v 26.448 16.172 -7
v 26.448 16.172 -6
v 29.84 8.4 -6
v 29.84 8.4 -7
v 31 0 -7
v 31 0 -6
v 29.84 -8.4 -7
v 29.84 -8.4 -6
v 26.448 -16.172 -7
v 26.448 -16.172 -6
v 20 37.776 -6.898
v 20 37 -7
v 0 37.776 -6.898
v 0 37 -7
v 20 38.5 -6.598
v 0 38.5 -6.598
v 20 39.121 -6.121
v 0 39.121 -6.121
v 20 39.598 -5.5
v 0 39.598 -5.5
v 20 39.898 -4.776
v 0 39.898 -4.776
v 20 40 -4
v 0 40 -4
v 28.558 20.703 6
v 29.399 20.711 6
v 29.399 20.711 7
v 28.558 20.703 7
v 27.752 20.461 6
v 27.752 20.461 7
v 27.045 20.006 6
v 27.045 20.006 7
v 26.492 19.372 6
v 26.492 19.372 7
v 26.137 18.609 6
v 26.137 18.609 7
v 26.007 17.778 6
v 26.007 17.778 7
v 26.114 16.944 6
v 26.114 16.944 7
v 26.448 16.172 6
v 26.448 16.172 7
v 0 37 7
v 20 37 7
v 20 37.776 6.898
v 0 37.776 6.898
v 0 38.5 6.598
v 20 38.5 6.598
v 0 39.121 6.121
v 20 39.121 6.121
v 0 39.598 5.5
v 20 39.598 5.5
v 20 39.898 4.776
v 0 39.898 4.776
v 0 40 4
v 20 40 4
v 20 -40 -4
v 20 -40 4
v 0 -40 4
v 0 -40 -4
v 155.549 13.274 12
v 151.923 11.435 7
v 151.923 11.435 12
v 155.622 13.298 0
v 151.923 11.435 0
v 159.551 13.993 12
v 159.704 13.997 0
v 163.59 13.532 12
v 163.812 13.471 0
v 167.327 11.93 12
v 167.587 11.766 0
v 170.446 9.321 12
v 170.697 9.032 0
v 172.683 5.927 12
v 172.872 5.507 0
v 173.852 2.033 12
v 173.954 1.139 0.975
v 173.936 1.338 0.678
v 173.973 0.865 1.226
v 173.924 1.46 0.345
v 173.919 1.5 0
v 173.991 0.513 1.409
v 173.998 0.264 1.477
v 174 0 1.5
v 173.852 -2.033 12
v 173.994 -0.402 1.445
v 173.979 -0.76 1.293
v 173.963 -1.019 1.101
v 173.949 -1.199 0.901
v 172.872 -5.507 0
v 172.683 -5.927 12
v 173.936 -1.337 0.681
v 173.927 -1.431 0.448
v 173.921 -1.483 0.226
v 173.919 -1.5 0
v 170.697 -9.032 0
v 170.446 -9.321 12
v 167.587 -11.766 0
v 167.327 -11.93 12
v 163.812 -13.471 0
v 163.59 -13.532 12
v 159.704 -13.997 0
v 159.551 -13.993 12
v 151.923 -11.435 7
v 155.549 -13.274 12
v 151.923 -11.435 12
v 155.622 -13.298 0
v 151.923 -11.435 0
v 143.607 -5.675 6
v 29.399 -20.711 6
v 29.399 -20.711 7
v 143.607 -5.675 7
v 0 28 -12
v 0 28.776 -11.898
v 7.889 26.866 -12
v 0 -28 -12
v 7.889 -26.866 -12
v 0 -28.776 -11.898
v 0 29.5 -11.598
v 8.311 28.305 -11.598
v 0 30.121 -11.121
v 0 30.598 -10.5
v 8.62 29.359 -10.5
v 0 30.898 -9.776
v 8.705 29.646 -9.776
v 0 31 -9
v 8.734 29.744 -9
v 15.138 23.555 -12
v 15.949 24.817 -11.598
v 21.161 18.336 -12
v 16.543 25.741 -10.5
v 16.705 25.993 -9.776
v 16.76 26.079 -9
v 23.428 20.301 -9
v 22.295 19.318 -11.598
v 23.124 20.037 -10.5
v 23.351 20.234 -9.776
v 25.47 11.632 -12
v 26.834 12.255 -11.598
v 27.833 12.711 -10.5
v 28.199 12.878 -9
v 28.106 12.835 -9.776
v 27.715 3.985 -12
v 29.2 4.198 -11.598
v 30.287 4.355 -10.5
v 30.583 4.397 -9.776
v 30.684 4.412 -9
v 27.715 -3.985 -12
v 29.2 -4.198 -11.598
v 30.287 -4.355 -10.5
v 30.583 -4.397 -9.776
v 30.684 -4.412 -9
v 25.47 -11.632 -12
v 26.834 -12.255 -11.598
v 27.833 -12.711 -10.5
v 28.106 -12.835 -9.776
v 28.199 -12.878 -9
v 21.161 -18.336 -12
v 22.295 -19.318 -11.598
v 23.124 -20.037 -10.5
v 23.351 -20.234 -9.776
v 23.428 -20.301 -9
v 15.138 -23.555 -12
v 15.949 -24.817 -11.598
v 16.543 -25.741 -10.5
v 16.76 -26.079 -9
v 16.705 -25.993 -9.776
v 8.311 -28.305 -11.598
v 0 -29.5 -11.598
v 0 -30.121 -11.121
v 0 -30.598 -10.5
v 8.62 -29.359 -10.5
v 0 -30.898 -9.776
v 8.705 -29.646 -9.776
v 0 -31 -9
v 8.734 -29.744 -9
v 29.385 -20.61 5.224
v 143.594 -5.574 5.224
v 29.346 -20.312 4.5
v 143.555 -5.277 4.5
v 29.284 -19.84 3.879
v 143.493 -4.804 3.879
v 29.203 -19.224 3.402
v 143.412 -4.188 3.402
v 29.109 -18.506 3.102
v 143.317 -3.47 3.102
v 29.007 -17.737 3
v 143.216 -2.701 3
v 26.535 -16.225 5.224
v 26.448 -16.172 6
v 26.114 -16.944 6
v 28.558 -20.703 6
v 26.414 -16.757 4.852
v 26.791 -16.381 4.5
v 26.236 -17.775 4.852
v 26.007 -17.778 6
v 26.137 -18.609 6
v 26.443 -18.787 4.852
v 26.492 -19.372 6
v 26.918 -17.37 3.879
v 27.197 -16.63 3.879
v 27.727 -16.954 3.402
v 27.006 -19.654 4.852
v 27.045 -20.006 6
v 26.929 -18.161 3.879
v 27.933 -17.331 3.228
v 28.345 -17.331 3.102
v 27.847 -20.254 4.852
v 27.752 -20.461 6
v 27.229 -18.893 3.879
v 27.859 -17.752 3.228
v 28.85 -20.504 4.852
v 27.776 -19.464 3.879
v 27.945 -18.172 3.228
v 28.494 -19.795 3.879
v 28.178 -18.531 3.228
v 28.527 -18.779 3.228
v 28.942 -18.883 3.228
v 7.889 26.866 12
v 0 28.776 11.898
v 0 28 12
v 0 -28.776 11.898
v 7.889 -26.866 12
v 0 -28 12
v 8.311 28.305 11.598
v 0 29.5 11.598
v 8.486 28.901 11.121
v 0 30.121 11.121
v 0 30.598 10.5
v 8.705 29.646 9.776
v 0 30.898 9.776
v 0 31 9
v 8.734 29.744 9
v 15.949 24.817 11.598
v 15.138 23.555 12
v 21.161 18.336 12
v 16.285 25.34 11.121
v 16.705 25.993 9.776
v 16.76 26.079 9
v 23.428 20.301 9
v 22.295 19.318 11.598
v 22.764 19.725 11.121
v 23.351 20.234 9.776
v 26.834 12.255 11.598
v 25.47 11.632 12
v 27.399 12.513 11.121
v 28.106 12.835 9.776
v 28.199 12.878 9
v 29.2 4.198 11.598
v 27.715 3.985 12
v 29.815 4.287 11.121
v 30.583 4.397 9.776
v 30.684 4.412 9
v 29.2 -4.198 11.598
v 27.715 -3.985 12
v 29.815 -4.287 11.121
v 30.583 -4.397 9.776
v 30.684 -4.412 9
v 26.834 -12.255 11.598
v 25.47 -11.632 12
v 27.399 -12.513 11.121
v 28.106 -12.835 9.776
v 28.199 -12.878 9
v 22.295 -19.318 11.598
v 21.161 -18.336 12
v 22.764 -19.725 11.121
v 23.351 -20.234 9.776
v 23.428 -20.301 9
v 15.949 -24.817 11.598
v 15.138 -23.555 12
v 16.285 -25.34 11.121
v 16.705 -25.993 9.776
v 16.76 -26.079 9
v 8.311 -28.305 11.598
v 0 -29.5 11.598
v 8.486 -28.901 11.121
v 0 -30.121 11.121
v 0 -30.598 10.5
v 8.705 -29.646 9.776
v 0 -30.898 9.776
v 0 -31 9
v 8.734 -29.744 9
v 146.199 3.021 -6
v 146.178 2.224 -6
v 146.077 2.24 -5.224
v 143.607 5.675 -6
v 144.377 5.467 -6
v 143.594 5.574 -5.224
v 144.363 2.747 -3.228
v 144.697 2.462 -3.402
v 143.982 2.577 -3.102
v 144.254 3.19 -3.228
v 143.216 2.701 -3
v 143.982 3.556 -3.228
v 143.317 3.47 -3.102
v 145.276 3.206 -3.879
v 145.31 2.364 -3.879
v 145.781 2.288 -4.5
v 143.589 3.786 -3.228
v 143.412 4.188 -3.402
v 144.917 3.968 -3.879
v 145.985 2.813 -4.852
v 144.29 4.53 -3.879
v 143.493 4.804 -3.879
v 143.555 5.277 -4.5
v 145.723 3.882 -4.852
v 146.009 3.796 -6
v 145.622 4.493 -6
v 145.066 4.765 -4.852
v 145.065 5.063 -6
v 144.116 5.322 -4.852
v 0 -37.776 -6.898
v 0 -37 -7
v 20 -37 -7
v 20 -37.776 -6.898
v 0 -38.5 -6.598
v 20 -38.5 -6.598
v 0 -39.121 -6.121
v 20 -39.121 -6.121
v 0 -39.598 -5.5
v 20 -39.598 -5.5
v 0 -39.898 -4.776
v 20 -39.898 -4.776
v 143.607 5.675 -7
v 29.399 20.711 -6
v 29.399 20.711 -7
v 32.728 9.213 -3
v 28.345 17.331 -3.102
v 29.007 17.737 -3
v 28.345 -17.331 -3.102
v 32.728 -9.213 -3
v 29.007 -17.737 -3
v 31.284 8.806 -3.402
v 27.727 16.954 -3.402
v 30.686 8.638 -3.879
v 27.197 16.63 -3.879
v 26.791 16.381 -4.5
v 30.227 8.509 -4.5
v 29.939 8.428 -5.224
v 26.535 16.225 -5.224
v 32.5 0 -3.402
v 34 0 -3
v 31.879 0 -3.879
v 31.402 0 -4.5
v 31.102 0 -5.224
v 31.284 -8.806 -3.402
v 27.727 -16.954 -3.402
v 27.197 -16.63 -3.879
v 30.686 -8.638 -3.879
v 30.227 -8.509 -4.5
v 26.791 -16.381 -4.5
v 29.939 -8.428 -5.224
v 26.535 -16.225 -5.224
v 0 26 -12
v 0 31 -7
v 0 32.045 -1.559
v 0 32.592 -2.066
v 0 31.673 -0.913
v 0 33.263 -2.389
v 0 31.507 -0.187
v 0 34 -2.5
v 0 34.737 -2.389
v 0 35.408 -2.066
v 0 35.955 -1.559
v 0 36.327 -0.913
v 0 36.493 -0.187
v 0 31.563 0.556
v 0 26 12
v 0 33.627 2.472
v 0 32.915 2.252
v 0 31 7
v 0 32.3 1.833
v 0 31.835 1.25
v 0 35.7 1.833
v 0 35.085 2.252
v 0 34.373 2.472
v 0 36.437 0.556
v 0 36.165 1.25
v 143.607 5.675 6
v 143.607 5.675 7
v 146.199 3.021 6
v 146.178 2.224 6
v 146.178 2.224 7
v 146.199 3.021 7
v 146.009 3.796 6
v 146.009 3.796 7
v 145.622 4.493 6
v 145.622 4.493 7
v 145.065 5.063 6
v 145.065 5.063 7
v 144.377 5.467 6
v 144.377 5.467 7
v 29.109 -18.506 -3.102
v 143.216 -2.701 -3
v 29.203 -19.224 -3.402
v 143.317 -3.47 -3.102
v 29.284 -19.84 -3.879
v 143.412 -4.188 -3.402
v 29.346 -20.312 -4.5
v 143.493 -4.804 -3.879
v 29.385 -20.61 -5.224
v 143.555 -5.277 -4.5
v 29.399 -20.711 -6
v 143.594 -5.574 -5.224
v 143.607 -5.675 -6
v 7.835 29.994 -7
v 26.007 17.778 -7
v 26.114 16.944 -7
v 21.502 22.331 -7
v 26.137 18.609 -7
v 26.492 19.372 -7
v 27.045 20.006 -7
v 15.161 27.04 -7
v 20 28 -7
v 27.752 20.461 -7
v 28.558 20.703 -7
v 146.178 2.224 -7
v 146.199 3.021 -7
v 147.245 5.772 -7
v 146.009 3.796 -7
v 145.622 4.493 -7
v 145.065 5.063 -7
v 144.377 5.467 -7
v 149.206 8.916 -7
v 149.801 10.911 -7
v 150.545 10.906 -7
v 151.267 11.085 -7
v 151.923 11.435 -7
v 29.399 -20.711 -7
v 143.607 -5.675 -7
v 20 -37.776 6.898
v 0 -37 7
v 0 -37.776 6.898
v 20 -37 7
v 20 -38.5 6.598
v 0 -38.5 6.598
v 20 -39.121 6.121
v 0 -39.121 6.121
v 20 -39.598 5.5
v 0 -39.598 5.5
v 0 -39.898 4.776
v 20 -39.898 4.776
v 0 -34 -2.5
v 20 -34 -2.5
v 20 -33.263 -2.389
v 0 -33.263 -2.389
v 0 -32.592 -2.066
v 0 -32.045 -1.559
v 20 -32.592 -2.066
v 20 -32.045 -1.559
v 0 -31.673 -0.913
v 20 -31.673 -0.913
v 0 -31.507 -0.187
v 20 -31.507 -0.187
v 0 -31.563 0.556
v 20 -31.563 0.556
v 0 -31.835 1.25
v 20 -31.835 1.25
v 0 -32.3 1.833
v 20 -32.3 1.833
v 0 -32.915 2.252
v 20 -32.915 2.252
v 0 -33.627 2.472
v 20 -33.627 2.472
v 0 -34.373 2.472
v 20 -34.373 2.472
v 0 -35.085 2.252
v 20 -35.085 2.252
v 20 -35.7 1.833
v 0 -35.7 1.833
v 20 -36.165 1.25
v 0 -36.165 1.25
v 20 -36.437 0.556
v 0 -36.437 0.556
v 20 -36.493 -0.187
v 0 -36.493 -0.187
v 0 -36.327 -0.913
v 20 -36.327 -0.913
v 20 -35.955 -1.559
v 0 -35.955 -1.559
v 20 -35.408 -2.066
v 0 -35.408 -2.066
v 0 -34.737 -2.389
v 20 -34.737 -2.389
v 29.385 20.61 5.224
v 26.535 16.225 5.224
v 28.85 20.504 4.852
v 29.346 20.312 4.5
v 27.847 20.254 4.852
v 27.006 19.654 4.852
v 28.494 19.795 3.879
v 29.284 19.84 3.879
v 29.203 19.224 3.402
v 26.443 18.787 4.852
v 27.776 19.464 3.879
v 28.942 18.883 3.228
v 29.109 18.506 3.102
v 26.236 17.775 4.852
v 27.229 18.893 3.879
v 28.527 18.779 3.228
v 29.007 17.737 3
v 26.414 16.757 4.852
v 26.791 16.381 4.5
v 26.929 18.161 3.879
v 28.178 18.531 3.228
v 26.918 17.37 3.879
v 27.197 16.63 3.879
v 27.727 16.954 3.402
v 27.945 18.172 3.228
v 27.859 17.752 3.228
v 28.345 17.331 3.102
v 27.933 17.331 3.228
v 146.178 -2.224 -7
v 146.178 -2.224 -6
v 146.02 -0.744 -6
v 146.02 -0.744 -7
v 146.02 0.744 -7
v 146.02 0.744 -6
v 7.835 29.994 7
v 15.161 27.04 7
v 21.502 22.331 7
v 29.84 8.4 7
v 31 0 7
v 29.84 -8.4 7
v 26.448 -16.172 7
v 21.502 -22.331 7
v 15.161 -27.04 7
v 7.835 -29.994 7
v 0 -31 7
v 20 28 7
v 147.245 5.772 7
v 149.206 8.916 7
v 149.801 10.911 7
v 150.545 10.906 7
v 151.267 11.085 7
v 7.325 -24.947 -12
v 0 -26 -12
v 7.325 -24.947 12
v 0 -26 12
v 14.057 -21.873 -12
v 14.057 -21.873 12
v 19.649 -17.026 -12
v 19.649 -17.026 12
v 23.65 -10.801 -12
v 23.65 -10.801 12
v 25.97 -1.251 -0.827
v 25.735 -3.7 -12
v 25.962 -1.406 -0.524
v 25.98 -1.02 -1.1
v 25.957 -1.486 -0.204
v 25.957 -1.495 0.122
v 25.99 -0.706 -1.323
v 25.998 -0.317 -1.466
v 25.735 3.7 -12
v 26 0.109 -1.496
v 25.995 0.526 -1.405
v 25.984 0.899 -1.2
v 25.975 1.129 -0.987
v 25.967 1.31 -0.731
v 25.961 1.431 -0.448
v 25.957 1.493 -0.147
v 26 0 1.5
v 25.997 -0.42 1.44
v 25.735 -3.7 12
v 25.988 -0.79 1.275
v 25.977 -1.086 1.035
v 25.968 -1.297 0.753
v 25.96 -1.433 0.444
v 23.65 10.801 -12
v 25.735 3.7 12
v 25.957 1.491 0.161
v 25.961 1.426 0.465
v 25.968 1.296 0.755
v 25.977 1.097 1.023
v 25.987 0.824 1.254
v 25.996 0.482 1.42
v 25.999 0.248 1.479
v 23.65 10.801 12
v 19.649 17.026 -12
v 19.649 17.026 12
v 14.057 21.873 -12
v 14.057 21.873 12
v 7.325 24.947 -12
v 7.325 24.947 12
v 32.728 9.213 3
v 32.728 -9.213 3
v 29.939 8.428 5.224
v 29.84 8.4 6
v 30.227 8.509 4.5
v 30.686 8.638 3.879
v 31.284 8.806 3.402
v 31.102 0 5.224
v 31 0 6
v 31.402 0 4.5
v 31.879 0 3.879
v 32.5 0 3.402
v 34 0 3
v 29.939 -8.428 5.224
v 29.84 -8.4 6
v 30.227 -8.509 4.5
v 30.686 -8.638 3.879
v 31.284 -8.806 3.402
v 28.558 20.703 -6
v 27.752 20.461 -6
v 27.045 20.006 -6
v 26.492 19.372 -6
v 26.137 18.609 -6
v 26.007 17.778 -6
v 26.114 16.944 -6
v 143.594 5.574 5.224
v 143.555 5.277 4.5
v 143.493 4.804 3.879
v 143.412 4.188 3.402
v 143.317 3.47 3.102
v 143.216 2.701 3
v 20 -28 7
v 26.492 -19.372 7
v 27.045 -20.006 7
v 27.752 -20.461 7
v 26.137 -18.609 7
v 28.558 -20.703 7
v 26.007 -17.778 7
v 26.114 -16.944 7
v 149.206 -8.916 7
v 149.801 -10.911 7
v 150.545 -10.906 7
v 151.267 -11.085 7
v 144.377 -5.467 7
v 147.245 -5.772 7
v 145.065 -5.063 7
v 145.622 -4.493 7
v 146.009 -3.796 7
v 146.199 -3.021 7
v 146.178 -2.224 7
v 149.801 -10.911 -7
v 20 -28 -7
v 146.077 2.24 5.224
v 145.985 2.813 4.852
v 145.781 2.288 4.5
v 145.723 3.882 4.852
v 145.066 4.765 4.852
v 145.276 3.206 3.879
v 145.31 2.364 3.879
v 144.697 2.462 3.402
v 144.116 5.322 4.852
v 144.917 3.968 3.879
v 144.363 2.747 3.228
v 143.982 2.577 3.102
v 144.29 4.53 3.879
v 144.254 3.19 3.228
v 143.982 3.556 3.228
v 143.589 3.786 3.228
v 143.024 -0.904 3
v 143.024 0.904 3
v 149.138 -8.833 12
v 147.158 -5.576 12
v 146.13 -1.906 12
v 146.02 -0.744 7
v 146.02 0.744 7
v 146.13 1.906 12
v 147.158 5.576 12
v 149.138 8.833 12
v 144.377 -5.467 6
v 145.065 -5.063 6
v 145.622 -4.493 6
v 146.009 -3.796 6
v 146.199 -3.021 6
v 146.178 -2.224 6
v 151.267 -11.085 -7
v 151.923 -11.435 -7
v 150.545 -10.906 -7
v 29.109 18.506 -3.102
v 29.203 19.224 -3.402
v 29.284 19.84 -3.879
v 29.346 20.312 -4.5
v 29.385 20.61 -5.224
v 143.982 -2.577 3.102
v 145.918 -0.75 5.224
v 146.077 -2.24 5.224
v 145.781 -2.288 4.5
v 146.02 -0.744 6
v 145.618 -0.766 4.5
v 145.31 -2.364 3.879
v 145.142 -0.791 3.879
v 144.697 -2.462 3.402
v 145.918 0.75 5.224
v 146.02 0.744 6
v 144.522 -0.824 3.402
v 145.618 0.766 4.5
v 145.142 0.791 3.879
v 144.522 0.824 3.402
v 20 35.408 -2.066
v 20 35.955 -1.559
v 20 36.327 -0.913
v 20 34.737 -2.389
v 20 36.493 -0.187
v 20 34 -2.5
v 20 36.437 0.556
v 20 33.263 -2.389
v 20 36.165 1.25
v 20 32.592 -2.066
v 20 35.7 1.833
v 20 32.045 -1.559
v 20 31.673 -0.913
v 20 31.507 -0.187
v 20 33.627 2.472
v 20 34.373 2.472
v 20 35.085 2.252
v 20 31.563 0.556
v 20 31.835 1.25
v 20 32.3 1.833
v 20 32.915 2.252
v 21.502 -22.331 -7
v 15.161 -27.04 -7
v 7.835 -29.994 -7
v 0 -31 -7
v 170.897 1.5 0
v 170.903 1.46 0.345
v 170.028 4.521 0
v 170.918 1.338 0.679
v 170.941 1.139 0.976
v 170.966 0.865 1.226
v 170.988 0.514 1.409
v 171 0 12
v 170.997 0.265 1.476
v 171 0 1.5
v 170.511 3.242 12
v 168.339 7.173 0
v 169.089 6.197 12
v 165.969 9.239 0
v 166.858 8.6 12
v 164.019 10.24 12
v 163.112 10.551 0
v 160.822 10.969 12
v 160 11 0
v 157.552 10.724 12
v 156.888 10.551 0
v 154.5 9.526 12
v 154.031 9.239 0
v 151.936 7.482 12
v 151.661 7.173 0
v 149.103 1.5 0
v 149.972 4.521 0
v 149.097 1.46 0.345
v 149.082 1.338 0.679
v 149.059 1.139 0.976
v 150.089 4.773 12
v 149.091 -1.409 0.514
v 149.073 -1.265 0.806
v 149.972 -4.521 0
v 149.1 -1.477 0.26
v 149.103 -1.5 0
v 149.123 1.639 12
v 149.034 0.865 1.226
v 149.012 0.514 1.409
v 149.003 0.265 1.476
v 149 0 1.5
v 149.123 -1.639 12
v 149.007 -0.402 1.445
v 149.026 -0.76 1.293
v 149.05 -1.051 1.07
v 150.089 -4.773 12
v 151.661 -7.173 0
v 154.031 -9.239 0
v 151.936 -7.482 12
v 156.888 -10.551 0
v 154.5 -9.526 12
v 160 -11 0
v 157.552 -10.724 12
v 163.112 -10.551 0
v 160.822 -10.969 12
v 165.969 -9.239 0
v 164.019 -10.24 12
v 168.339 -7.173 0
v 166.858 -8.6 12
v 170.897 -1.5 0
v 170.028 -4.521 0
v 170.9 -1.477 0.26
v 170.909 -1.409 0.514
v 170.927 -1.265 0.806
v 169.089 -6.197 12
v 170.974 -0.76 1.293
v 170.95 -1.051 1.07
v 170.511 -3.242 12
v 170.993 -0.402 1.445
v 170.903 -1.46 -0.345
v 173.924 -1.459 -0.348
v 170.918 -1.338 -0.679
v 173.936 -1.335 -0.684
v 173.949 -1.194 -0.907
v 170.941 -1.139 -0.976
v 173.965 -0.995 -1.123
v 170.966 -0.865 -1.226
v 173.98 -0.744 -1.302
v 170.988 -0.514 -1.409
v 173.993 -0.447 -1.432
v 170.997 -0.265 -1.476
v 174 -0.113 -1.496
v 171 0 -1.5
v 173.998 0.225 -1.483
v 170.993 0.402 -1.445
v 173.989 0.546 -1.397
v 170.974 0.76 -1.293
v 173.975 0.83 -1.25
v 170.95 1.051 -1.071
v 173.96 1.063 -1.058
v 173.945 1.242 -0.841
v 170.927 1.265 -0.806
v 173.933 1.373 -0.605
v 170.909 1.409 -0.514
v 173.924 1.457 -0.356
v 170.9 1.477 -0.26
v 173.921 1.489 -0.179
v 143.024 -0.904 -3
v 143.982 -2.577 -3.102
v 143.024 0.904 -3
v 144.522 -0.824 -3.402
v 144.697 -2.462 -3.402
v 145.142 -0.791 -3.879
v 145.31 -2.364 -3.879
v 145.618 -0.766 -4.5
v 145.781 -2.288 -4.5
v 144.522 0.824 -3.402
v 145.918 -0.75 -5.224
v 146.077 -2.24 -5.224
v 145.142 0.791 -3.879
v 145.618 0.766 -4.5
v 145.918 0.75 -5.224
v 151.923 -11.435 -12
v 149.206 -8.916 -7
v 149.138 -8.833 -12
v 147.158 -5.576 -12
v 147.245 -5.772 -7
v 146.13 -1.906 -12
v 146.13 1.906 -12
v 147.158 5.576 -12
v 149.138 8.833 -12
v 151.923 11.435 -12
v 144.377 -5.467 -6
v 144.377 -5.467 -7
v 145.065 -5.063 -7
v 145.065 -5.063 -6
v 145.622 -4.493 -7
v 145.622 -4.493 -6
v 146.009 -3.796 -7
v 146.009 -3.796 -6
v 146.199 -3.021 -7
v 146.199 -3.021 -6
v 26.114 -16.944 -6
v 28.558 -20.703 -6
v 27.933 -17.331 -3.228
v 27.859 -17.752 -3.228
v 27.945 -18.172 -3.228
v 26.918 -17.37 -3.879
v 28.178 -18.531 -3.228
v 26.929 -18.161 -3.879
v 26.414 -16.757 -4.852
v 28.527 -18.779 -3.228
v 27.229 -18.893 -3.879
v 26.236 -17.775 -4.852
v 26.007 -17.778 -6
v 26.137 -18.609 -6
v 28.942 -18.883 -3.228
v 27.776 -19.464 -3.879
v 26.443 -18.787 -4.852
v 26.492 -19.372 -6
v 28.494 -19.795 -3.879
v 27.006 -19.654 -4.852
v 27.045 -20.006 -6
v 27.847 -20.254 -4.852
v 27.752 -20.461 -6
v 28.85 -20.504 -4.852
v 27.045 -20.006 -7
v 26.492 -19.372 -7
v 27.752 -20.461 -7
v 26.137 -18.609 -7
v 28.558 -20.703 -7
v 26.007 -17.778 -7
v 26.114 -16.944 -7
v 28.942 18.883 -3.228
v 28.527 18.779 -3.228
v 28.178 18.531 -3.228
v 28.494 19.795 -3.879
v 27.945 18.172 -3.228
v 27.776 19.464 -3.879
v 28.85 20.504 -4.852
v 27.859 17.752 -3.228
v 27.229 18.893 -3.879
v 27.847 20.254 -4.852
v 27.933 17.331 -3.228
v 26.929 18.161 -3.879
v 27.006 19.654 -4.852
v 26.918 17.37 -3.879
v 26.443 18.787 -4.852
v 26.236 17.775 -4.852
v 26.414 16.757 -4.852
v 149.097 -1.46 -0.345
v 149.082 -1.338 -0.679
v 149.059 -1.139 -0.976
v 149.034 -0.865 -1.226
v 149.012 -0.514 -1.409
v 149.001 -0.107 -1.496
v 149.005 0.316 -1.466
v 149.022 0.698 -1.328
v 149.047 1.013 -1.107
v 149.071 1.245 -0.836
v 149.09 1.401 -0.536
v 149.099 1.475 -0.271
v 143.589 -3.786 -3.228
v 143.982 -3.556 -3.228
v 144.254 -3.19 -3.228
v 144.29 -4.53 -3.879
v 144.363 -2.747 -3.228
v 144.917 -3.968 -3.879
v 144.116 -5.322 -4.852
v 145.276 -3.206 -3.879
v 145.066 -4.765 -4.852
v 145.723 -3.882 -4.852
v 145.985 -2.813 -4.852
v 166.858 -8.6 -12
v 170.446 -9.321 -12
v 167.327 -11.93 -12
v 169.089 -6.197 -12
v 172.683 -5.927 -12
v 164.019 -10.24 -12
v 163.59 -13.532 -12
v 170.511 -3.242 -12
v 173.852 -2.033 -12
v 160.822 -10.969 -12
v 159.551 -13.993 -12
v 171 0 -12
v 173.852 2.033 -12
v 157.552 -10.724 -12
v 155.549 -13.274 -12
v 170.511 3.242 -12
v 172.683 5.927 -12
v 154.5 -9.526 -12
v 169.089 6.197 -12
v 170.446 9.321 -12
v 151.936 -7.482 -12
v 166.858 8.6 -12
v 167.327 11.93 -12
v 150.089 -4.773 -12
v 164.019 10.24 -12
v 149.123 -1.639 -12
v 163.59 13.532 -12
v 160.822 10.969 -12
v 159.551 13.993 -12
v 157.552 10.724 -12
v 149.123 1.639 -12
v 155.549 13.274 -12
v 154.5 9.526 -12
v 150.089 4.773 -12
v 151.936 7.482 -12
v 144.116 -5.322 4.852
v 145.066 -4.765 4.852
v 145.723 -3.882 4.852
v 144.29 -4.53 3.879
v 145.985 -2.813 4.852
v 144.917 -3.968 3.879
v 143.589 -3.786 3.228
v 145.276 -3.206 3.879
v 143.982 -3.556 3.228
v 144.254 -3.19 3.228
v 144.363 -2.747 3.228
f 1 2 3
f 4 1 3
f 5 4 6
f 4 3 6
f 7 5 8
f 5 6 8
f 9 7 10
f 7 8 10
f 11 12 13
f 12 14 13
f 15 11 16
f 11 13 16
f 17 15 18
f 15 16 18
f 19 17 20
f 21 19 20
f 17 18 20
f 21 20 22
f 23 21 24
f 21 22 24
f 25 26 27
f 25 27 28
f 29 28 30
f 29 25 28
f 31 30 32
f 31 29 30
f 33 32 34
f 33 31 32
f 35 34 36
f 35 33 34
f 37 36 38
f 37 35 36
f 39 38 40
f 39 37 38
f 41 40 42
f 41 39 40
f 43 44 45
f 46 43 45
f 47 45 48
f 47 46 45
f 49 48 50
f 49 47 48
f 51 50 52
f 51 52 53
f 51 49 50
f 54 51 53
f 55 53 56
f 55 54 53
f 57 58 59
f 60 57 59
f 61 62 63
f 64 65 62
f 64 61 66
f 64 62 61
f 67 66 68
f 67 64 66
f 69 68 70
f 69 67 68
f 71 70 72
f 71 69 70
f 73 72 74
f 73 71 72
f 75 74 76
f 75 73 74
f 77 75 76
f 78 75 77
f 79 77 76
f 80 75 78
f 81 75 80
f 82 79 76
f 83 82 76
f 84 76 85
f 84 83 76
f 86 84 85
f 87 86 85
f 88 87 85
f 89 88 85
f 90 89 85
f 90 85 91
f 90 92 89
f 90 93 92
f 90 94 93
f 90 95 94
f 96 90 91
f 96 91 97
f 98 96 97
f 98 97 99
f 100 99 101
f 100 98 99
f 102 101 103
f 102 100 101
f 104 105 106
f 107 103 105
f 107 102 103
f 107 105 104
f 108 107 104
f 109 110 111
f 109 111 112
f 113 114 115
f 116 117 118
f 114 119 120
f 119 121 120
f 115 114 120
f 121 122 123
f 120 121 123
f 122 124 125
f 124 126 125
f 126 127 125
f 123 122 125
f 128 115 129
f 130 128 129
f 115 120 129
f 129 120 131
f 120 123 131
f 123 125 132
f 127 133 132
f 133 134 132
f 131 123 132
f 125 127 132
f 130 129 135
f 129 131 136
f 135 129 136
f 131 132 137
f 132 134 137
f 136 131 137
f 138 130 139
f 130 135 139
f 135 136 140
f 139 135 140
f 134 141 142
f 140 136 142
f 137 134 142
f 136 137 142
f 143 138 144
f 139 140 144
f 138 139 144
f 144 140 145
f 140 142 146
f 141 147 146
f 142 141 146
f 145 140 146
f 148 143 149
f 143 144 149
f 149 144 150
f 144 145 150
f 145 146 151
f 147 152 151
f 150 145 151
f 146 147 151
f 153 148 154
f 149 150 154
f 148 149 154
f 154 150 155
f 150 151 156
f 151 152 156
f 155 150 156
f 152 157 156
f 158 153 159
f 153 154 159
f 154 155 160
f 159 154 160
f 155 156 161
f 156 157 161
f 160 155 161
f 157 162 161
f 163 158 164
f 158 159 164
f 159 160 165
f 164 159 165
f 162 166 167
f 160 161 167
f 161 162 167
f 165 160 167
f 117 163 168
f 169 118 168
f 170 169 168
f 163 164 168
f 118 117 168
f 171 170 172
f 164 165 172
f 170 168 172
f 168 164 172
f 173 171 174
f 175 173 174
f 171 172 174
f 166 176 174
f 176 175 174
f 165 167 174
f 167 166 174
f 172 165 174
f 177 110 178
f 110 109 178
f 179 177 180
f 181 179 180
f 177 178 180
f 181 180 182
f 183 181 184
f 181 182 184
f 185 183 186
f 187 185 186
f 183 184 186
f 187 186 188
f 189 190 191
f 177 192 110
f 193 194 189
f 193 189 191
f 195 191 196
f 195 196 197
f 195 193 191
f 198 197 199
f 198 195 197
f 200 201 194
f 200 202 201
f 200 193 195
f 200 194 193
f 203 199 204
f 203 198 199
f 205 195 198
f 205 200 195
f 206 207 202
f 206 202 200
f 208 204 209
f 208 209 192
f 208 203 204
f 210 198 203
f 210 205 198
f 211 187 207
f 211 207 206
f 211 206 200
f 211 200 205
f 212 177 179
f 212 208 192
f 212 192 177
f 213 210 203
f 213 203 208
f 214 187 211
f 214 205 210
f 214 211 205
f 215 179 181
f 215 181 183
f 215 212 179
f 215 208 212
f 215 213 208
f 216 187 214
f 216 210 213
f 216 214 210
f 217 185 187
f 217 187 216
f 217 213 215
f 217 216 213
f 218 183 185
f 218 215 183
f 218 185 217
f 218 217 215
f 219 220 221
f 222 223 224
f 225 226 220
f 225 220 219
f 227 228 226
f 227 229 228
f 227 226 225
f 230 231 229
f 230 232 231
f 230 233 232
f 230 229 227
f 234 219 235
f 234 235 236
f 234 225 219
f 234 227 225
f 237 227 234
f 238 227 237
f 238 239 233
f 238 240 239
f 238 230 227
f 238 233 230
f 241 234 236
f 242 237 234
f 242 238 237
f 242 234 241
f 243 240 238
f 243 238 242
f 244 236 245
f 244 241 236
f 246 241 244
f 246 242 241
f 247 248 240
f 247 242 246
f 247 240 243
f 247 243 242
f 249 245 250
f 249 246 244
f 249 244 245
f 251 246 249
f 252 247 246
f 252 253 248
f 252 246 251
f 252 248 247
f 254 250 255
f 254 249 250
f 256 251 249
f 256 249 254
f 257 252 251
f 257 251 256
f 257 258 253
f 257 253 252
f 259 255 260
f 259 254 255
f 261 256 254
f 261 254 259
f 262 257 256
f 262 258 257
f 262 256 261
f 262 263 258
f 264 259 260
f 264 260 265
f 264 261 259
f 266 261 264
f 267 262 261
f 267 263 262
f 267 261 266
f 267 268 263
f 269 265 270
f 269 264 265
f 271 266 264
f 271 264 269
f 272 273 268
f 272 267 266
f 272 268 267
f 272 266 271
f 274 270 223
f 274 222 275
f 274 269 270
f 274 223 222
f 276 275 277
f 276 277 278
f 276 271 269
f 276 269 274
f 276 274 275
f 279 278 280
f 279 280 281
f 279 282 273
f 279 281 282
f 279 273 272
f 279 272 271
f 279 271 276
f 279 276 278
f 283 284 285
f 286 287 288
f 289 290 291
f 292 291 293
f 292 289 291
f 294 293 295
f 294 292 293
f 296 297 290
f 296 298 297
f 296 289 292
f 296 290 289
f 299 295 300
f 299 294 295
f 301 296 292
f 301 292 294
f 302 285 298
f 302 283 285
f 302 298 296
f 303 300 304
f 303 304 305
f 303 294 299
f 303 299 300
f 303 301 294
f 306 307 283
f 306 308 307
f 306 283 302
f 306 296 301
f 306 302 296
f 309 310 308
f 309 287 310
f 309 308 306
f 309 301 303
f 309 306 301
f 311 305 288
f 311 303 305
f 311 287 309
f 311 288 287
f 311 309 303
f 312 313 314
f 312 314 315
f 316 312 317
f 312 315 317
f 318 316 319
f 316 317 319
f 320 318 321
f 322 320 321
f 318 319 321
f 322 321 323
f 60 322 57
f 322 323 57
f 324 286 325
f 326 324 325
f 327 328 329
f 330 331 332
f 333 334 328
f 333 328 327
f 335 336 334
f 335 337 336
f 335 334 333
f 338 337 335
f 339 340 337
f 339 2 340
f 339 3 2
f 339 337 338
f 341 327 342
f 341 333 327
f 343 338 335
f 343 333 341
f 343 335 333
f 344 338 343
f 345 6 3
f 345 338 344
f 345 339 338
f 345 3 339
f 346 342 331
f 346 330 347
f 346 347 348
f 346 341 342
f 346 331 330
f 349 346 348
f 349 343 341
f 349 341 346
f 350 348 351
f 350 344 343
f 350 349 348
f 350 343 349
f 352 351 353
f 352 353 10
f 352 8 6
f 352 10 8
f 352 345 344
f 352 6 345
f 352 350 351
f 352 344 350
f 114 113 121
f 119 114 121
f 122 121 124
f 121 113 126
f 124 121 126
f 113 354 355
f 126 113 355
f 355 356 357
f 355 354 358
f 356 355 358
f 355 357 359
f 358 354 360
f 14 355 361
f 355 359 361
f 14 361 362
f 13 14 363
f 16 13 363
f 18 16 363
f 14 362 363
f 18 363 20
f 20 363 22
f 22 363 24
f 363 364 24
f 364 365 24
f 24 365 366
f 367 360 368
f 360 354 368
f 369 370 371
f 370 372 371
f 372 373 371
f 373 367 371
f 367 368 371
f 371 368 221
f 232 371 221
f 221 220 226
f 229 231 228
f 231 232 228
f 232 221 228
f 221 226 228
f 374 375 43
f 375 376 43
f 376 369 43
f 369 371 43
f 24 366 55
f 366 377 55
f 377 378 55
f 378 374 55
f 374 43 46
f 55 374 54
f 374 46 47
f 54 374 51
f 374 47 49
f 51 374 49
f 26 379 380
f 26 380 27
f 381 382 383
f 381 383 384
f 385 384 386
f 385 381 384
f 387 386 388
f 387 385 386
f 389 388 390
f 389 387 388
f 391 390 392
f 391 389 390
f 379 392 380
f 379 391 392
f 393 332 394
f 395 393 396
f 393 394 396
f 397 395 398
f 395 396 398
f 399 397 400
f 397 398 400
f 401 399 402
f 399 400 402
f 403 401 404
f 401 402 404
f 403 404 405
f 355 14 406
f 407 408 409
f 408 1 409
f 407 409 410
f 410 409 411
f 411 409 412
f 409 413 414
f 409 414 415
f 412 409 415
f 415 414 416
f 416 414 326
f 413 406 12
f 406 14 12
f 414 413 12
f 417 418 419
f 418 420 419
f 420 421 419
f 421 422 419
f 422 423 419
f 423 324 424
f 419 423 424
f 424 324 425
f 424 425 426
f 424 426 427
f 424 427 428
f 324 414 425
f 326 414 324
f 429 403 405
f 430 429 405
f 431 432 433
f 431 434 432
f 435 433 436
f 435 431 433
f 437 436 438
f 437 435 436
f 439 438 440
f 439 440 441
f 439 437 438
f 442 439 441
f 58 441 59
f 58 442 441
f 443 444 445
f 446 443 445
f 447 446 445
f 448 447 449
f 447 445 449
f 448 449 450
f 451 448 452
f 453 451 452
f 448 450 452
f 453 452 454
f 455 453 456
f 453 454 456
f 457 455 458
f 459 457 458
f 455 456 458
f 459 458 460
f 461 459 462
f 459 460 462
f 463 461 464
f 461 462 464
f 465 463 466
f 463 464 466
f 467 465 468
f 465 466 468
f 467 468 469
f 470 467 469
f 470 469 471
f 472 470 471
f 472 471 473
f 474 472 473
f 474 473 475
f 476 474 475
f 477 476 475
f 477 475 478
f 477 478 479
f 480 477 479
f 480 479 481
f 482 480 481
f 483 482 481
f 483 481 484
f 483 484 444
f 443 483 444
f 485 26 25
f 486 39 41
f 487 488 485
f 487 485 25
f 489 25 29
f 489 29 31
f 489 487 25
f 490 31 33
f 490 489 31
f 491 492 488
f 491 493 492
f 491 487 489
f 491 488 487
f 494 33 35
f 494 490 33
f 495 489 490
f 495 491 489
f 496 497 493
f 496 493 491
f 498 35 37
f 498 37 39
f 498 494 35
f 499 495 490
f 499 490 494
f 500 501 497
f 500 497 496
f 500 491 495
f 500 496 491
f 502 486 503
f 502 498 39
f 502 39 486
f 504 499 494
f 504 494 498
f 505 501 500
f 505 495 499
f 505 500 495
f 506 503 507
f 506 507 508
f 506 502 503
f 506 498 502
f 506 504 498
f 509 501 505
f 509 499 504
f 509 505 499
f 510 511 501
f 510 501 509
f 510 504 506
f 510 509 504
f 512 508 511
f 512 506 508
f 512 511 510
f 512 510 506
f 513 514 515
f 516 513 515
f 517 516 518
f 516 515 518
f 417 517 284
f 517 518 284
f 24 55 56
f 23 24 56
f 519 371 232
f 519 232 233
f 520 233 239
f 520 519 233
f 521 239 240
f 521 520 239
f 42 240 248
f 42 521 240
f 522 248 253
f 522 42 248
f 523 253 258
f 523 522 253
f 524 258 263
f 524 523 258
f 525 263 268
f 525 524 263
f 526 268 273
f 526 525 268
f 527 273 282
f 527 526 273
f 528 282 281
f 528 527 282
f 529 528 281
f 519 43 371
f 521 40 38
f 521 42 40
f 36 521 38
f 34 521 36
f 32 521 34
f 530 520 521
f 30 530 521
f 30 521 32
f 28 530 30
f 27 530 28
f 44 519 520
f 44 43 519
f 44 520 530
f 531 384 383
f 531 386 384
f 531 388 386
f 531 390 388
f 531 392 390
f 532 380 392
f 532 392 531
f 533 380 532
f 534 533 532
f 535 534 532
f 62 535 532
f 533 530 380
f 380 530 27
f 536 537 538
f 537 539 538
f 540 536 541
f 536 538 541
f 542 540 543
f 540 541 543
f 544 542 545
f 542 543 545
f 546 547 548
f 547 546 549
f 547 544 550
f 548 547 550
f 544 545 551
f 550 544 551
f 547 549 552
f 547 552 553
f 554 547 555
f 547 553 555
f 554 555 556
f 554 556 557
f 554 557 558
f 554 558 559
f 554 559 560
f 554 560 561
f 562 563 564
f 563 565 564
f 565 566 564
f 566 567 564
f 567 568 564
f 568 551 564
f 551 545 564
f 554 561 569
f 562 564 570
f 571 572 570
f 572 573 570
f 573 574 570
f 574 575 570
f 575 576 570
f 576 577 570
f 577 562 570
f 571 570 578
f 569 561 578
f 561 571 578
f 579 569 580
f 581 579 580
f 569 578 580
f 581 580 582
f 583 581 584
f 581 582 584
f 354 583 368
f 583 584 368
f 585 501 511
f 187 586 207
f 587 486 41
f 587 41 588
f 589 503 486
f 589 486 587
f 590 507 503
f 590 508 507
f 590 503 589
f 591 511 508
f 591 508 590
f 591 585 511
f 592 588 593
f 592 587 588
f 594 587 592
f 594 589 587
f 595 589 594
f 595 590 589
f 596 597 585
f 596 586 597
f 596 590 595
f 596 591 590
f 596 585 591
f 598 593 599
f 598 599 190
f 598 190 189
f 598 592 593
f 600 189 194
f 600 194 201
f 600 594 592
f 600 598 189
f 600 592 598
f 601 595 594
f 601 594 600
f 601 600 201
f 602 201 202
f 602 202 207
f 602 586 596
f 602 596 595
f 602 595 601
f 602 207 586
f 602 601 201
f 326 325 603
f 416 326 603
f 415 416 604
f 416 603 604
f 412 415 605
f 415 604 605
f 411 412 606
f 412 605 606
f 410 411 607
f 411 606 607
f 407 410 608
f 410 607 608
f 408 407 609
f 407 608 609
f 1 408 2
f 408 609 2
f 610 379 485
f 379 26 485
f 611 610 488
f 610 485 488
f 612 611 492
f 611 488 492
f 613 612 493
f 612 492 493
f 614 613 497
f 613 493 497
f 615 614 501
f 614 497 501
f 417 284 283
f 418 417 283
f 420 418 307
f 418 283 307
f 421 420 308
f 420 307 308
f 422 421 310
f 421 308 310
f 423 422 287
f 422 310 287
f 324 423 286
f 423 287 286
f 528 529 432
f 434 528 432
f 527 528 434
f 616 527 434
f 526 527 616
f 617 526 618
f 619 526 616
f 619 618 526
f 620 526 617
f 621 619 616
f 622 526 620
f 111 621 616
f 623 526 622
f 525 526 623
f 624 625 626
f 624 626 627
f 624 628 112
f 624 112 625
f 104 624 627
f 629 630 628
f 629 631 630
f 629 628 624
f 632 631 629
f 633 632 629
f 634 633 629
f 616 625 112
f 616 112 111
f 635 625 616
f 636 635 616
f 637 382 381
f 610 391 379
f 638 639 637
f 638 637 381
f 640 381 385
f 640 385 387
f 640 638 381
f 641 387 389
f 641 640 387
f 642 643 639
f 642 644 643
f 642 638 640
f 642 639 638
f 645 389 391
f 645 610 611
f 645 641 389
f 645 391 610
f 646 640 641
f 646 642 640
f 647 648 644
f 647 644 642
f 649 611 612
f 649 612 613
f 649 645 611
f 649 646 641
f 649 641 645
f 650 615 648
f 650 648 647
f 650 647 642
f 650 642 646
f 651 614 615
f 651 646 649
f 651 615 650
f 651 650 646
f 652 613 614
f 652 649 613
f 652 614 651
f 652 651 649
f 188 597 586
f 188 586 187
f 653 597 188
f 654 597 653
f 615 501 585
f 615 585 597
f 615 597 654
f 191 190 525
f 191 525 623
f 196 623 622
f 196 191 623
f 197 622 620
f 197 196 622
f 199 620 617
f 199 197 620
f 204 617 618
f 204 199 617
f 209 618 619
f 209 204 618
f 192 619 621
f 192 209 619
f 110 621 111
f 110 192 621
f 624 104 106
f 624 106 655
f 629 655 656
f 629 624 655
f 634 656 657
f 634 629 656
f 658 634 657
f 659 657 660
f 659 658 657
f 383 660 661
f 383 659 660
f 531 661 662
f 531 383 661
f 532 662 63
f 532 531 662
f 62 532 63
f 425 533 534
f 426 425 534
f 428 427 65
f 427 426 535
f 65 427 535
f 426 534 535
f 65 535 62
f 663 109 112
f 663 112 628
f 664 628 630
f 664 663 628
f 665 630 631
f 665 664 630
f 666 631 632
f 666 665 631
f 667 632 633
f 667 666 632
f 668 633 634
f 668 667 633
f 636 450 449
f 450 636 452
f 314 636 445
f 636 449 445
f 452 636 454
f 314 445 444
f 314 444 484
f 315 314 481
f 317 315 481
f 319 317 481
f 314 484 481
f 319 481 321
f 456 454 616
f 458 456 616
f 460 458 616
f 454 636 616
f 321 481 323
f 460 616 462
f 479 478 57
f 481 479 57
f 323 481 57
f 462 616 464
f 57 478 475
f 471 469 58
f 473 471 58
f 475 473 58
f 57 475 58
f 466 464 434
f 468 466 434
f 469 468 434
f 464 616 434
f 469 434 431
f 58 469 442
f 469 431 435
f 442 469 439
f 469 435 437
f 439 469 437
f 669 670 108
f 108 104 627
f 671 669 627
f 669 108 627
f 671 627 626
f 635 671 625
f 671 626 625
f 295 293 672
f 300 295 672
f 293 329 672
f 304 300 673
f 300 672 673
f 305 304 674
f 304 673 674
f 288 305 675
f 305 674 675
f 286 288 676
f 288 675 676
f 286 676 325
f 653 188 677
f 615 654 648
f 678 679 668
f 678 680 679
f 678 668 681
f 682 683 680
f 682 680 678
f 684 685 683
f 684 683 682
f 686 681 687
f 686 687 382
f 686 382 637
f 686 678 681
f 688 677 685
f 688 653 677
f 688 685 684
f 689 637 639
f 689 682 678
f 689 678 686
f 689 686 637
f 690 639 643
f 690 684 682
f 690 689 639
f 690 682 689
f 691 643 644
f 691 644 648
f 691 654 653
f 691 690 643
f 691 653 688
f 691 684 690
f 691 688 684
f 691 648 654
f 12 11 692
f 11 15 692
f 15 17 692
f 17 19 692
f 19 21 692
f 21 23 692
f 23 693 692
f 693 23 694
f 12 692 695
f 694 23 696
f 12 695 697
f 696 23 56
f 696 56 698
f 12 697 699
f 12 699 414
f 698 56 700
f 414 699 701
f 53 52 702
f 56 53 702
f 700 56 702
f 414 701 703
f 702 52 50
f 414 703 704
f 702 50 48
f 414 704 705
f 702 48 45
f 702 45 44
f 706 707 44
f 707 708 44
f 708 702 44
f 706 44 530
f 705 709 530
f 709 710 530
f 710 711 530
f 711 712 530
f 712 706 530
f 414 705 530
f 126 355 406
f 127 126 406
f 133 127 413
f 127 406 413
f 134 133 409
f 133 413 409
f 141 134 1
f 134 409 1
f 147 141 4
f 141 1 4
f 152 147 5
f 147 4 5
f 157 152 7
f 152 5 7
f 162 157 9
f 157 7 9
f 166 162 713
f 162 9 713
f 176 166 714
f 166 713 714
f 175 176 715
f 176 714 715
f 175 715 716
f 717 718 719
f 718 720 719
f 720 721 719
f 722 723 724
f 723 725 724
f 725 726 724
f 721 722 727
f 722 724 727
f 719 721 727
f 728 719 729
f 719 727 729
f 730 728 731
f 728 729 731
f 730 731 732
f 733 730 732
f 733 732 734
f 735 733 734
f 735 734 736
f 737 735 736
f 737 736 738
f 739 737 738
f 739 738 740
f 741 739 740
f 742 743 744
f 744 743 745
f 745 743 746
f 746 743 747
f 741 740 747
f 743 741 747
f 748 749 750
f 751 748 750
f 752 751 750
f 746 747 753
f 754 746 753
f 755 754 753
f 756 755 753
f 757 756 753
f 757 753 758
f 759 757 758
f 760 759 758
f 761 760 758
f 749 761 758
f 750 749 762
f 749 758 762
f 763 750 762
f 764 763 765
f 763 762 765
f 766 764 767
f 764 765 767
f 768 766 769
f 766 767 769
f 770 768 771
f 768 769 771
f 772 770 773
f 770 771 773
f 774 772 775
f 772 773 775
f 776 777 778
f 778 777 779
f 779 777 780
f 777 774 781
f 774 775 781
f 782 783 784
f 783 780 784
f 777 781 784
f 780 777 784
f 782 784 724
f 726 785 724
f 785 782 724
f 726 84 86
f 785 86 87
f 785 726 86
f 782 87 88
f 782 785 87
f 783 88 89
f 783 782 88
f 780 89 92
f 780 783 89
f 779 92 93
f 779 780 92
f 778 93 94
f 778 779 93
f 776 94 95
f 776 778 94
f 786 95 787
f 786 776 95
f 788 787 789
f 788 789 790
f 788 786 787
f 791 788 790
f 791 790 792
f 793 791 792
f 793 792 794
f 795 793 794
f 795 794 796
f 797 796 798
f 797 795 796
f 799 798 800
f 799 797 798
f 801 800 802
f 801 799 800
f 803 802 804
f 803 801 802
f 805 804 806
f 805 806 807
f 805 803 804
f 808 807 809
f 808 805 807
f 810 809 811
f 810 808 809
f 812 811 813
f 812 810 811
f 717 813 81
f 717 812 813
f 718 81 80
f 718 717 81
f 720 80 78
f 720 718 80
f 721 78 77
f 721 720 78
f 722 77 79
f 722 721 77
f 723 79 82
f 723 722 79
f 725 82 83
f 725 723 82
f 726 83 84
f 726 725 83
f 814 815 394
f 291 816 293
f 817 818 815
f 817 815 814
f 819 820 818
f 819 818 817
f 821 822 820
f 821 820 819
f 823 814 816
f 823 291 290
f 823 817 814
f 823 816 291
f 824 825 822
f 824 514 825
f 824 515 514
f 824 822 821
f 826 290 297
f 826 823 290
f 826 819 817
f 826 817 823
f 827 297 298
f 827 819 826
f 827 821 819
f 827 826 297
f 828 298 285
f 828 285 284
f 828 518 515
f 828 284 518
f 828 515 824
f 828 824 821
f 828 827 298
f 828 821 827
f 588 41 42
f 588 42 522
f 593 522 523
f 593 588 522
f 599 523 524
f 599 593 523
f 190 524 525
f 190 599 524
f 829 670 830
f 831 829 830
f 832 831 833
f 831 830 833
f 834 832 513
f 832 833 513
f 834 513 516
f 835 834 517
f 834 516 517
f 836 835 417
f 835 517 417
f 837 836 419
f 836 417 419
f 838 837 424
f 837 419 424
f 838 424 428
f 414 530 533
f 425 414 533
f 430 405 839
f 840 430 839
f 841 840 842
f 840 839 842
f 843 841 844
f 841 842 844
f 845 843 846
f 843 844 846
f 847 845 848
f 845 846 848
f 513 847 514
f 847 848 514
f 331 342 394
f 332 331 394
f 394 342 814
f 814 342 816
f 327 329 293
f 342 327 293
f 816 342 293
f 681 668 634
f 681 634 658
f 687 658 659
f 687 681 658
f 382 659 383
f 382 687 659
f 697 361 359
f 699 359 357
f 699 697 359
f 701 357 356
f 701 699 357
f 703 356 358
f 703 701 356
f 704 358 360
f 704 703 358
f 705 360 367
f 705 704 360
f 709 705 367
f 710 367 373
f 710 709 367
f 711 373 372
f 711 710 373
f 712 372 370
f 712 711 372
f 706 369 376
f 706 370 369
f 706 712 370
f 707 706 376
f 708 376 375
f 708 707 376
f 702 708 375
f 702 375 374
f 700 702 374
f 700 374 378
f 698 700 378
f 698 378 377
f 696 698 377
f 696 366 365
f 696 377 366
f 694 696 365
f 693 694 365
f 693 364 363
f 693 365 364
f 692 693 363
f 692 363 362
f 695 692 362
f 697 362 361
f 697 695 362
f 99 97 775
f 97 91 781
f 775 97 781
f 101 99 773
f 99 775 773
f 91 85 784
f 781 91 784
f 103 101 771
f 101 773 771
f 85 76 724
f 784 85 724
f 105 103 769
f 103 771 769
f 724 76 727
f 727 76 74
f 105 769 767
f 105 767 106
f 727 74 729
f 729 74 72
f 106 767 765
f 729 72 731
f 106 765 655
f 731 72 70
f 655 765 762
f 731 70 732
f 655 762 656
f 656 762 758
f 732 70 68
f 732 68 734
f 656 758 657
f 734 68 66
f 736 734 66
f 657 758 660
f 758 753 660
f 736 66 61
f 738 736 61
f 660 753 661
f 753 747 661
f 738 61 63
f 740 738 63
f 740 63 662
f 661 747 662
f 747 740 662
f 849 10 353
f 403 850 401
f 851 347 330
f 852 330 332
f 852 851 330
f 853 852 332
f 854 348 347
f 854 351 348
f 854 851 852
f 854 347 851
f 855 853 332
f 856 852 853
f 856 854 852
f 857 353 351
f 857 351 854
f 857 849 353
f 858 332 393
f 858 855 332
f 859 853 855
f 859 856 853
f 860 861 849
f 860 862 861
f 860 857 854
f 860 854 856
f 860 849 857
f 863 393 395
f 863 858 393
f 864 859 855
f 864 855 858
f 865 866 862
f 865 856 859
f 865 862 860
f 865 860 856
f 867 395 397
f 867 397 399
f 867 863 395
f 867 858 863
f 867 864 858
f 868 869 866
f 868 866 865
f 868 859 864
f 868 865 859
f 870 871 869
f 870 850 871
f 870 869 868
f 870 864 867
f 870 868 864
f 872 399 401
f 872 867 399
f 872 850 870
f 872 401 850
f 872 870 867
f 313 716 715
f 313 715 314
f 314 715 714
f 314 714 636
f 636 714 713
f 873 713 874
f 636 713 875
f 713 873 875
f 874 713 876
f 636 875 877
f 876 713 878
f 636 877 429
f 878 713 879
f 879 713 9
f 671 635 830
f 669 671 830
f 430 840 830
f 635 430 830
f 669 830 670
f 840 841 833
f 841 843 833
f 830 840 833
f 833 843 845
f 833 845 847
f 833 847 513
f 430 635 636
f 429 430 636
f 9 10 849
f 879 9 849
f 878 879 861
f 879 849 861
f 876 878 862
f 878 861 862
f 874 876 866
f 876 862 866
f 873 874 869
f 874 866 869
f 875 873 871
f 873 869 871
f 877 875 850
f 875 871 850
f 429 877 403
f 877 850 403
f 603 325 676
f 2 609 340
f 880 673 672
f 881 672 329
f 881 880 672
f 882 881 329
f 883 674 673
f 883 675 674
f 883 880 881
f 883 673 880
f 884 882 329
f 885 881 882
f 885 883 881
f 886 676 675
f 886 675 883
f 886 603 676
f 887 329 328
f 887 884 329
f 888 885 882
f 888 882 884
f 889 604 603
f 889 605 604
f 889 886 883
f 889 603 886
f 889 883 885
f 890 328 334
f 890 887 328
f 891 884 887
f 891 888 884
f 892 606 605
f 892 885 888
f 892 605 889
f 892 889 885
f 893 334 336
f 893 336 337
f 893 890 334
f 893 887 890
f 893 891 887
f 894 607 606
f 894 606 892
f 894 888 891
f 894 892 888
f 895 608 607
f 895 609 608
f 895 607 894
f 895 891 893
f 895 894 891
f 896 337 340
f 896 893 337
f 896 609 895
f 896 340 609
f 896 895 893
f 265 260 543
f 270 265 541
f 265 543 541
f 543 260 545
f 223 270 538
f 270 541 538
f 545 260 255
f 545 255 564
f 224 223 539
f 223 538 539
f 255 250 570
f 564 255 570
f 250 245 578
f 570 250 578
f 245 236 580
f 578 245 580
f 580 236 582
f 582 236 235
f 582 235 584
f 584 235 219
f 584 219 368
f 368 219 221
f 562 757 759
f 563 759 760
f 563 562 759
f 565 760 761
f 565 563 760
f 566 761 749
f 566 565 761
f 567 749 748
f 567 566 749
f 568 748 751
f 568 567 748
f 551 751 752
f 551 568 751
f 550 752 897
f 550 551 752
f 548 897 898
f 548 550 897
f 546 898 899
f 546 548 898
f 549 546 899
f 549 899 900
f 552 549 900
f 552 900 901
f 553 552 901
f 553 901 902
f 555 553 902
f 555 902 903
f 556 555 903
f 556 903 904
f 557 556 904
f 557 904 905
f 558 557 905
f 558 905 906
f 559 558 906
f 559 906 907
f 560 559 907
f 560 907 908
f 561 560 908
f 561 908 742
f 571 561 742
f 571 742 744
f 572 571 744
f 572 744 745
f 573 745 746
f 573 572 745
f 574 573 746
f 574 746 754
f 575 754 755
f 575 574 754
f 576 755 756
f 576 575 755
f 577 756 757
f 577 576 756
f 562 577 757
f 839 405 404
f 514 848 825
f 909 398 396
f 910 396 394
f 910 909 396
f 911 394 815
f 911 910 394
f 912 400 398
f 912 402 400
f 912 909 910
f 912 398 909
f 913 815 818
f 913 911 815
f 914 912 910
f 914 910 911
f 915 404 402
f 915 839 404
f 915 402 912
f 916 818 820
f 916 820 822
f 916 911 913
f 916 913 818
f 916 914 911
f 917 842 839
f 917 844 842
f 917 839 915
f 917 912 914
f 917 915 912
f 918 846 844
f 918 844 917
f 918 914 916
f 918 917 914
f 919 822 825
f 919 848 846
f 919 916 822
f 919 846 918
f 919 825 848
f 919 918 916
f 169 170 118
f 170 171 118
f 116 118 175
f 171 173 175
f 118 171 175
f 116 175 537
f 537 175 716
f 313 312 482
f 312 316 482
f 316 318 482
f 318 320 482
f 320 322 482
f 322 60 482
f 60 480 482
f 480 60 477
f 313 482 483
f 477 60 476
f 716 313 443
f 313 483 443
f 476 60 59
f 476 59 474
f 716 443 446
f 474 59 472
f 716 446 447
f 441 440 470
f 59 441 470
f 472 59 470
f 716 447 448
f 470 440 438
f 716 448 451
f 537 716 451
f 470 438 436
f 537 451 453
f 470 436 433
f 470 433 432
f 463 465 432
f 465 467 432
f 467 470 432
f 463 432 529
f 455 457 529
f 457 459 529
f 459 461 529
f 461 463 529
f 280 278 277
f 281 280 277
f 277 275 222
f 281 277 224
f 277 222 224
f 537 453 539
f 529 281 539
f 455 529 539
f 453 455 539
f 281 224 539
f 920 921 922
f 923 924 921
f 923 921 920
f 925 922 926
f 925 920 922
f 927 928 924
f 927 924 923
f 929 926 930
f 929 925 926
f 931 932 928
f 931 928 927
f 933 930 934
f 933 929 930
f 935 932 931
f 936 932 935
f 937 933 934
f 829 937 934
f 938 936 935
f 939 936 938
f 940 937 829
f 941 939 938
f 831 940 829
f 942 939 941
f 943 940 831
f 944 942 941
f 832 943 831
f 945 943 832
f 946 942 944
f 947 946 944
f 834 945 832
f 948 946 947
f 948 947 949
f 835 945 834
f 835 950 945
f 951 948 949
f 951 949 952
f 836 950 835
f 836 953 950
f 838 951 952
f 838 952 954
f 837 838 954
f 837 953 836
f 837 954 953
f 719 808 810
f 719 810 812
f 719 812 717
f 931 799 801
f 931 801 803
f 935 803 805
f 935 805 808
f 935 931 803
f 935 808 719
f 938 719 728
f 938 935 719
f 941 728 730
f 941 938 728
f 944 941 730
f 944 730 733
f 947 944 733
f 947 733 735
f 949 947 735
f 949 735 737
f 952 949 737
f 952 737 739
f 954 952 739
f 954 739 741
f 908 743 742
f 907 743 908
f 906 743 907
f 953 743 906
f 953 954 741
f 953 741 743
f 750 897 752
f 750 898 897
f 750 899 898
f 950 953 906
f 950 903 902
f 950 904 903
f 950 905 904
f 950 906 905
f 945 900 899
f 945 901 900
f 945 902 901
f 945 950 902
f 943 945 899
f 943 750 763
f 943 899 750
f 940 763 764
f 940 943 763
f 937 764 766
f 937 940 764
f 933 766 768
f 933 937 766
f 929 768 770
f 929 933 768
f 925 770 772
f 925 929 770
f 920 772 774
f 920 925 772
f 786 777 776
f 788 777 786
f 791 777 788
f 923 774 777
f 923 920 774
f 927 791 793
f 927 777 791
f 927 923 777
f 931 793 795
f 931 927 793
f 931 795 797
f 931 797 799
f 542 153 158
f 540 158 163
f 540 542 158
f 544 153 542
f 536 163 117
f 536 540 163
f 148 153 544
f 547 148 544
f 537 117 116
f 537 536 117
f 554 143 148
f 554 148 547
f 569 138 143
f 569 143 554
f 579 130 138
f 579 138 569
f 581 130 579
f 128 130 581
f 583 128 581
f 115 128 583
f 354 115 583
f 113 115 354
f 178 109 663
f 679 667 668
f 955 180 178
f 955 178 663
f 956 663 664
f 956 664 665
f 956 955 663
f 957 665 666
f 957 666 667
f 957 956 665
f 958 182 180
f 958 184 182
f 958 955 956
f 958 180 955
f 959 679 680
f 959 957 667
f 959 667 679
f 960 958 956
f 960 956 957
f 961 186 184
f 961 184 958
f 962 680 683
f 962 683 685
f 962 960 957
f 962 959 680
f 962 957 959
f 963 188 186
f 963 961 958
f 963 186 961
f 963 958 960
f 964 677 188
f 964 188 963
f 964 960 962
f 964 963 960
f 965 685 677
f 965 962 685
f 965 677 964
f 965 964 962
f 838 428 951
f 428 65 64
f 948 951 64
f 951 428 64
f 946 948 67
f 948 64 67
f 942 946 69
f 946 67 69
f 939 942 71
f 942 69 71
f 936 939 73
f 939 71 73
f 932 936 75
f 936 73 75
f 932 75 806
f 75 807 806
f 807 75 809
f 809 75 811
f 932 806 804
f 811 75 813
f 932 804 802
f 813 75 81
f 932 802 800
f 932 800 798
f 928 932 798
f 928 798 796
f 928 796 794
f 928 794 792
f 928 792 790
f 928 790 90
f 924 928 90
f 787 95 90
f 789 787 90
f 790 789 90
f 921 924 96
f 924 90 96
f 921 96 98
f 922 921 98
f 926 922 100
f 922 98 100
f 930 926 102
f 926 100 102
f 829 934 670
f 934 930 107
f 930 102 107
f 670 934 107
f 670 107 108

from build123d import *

# Parameters (mm, degrees)
EXTRUDE_1_DEPTH     = 12
SKETCH_3_R          = 11
CUT_EXTRUDE_1_DEPTH = 179.941331168
CUT_EXTRUDE_START   = -5
CUT_EXTRUDE_2_DEPTH = 5
CUT_EXTRUDE_START_2 = -4
CUT_EXTRUDE_3_DEPTH = 4
SKETCH_6_R          = 2.5
CUT_EXTRUDE_4_DEPTH = 160.561900214
FILLET_1_R          = 3
FILLET_2_R          = 3
SKETCH_7_R          = 1.5
CUT_EXTRUDE_6_DEPTH = 179.941331168


with BuildPart() as part:
    # 草图1 → 拉伸1 (new body)
    with BuildSketch(Plane.XY):
        with BuildLine():
            Line((0, -40), (0, -26))
            ThreePointArc((0, -26), (26, 0), (0, 26))
            Line((0, 26), (0, 40))
            Line((0, 40), (20, 40))
            Line((20, 40), (20, 28))
            Line((20, 28), (149.800932204, 10.911383086))
            ThreePointArc((149.800932204, 10.911383086), (150.911506836, 10.973150989), (151.923244173, 11.435296905))
            ThreePointArc((151.923244173, 11.435296905), (174, 0), (151.923244173, -11.435296905))
            ThreePointArc((151.923244173, -11.435296905), (150.911506836, -10.973150989), (149.800932204, -10.911383086))
            Line((149.800932204, -10.911383086), (20, -28))
            Line((20, -28), (20, -40))
            Line((20, -40), (0, -40))
        make_face()
    extrude(amount=EXTRUDE_1_DEPTH)

    # 草图3 → 切除-拉伸1 (cut, through all)
    with BuildSketch(Plane.XY.offset(12)):
        with Locations((160, 0)):
            Circle(SKETCH_3_R)
    extrude(amount=-CUT_EXTRUDE_1_DEPTH, mode=Mode.SUBTRACT)

    # 草图4 → 切除-拉伸2 (cut)
    with BuildSketch(Plane.XY.offset(12).offset(CUT_EXTRUDE_START)):
        with BuildLine():
            Line((0, 40), (0, 31))
            ThreePointArc((0, 31), (31, 0), (0, -31))
            Line((0, -31), (0, -40))
            Line((0, -40), (20, -40))
            Line((20, -40), (20, -28))
            Line((20, -28), (149.800932204, -10.911383086))
            ThreePointArc((149.800932204, -10.911383086), (150.911506836, -10.973150989), (151.923244173, -11.435296905))
            ThreePointArc((151.923244173, -11.435296905), (146, 0), (151.923244173, 11.435296905))
            ThreePointArc((151.923244173, 11.435296905), (150.911506836, 10.973150989), (149.800932204, 10.911383086))
            Line((149.800932204, 10.911383086), (20, 28))
            Line((20, 28), (20, 40))
            Line((20, 40), (0, 40))
        make_face()
    extrude(amount=CUT_EXTRUDE_2_DEPTH, mode=Mode.SUBTRACT)

    # 草图5 → 切除-拉伸3 (cut)
    with BuildSketch(Plane.XY.offset(7).offset(CUT_EXTRUDE_START_2)):
        with BuildLine():
            Line((143.607465988, 5.674994619), (29.398745634, 20.7108579))
            ThreePointArc((29.398745634, 20.7108579), (26.491956539, 19.371673477), (26.44771114, 16.171535964))
            ThreePointArc((26.44771114, 16.171535964), (31, 0), (26.44771114, -16.171535964))
            ThreePointArc((26.44771114, -16.171535964), (26.491956539, -19.371673477), (29.398745634, -20.7108579))
            Line((29.398745634, -20.7108579), (143.607465988, -5.674994619))
            ThreePointArc((143.607465988, -5.674994619), (145.621853626, -4.492677495), (146.177789633, -2.22407297))
            ThreePointArc((146.177789633, -2.22407297), (146, 0), (146.177789633, 2.22407297))
            ThreePointArc((146.177789633, 2.22407297), (145.621853626, 4.492677495), (143.607465988, 5.674994619))
        make_face()
    extrude(amount=CUT_EXTRUDE_3_DEPTH, mode=Mode.SUBTRACT)

    # 镜向1: part across plane


with BuildPart() as part_1:
    add(part.part)
    add(part.part.mirror(Plane.XY))

    # 草图6 → 切除-拉伸4 (cut, through all)
    with BuildSketch(Plane(origin=(20, 0, 0), x_dir=(0, 0, -1), z_dir=(1, 0, 0))):
        with Locations((0, -34)):
            Circle(SKETCH_6_R)
    cut_extrude_4 = extrude(amount=-CUT_EXTRUDE_4_DEPTH, mode=Mode.SUBTRACT)

    # 镜向2: 切除-拉伸4 across plane
    add(cut_extrude_4.mirror(Plane.ZX), mode=Mode.SUBTRACT)

    # 圆角1
    fillet_1_edges = [part_1.edges().sort_by_distance(p)[0] for p in [
        (10, 40, 7),
        (10, -40, 7),
        (31, 0, 12),
        (26.491956539, 19.371673477, 3),
        (86.503105811, 13.192926259, 3),
        (145.621853626, 4.492677495, 3),
        (146, 0, 3),
        (145.621853626, -4.492677495, 3),
        (86.503105811, -13.192926259, 3),
        (26.491956539, -19.371673477, 3),
        (31, 0, 3),
    ]]
    fillet(fillet_1_edges, radius=FILLET_1_R)

    # 圆角2
    fillet_2_edges = [part_1.edges().sort_by_distance(p)[0] for p in [
        (10, 40, -7),
        (10, -40, -7),
        (146, 0, -3),
        (31, 0, -12),
        (31, 0, -3),
        (26.491956539, 19.371673477, -3),
        (86.503105811, 13.192926259, -3),
        (145.621853626, 4.492677495, -3),
        (145.621853626, -4.492677495, -3),
        (86.503105811, -13.192926259, -3),
        (26.491956539, -19.371673477, -3),
    ]]
    fillet(fillet_2_edges, radius=FILLET_2_R)

    # 草图7 → 切除-拉伸6 (cut, through all)
    with BuildSketch(Plane(origin=(0, 0, 0), x_dir=(0, 0, -1), z_dir=(1, 0, 0))):
        with Locations(Location((0, 0, 0), (0, 0, 180))):
            Circle(SKETCH_7_R)
    extrude(amount=CUT_EXTRUDE_6_DEPTH, mode=Mode.SUBTRACT)


solid = part_1.part
